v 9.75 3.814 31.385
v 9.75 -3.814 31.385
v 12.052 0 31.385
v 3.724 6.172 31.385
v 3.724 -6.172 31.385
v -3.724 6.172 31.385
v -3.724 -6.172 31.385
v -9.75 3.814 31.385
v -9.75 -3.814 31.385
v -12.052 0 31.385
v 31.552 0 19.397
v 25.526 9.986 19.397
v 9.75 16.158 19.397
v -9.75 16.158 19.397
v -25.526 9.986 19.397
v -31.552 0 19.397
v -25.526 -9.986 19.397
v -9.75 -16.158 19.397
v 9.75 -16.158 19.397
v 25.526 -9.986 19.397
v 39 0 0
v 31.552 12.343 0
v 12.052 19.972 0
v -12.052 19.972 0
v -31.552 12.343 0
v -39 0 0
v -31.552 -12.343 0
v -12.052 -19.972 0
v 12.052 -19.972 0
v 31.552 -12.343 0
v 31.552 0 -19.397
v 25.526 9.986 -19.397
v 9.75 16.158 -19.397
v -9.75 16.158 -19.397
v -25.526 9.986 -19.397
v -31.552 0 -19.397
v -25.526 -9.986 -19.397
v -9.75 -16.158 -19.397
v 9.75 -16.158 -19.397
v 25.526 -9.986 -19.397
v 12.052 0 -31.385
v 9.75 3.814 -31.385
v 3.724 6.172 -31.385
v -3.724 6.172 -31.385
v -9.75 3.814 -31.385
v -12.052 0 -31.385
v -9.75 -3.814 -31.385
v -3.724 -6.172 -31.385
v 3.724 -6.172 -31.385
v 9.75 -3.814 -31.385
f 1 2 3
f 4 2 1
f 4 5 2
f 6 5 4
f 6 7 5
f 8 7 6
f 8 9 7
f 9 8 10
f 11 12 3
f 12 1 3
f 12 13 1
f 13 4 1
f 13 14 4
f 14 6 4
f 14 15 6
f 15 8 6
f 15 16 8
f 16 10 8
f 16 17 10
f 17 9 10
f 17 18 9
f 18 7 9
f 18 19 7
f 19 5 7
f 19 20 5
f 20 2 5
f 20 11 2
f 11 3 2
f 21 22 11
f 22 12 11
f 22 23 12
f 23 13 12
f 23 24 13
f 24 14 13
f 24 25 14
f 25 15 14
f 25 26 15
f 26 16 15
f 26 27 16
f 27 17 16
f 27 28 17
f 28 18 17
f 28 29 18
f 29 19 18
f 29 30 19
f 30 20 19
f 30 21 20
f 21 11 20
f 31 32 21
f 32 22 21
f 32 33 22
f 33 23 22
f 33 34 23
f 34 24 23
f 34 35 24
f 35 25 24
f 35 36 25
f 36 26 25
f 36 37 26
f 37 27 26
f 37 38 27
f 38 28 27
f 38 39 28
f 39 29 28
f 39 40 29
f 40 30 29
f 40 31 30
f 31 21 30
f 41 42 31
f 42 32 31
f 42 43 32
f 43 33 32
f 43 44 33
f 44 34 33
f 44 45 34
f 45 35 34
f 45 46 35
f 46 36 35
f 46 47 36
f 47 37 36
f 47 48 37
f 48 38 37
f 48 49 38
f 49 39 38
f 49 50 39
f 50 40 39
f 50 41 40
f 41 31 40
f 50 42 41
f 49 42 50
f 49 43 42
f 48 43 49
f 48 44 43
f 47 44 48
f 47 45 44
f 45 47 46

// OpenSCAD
// Generated by SolidPython 1.0.1 on 2020-07-29 00:46:50


scale(v = [13, 7, 11]) {
	sphere(r = 3);
}
/***********************************************
*********      SolidPython code:      **********
************************************************
 
# import packages: SolidPython
from solid import *
from solid.utils import *
from itertools import chain, combinations, permutations


class Resize:

    def __init__(self, scad_file):
        self.scad_file = scad_file
        #self.scad_file = import_scad(scad_file)
        # cone/cylinder param:
        self.r1 = 0
        self.r2 = 0
        self.h = 0
        # rectangular prism param:
        self.w = 0
        self.l = 0
        # ellipse param:
        self.r = 0

    # import OpenScad code (file name corresponds to shape)


    # classify shape + parameters
    def assign(self, param1, param2, param3):
        if self.scad_file == 'cone.scad':
            self.r1 = param1
            self.r2 = param2
            self.h = param3
        elif self.scad_file == 'cylinder.scad':
            self.r1 = param1
            self.r2 = param2
            self.h = param3
        elif self.scad_file == 'rectangularPrism.scad':
            self.h = param1
            self.l = param2
            self.w = param3
        else:
            self.r = param1
            self.h = param2

    # resize parameters
    def iterate(self):
        x = range(3, 20, 2)
        i = 1
        if self.scad_file == 'cone.scad':
            tempList = list(permutations(x, 2))
            for temp in tempList:
                param1 = temp[0]
                param2 = temp[1]
                filepath = 'produced_scad_files/' + 'cone' + str(param1) + '_' + str(param2) + '_' + '.scad'
                scad_render_to_file(cylinder(h=param1, r1=param2, r2=0), filepath)

        elif self.scad_file == 'cylinder.scad':
            tempList = list(permutations(x, 3))
            for temp in tempList:
                param1 = temp[0]
                param2 = temp[1]
                filepath = 'produced_scad_files/' + 'cylinder' + str(param1) + '_' + str(param2) + '_' + '.scad'
                scad_render_to_file(cylinder(h=param1, r1=param2, r2=param2), filepath)

        elif self.scad_file == 'rectangularPrism.scad':
            tempList = list(permutations(x, 3))
            for temp in tempList:
                param1 = temp[0]
                param2 = temp[1]
                param3 = temp[2]
                filepath = 'produced_scad_files/' + 'rectangularPrism' + str(param1) + '_' + str(param2) + '_' + str(
                    param3) + '.scad'
                scad_render_to_file(cube(size=(param1, param2, param3)), filepath)

        elif self.scad_file == 'ellipse.scad':
            tempList = list(permutations(x, 4))
            for temp in tempList:
                param1 = temp[0]
                param2 = temp[1]
                param3 = temp[2]
                param4 = temp[3]
                filepath = 'produced_scad_files/' + 'ellipse' + str(param1) + '_' + str(param2) + '_' + str(param3) + '_' + str(param4) + '.scad'
                scad_render_to_file(scale([param1, param2, param3])(sphere(r=param4)), filepath)

    def render_to_scadfile(self):
        scad_render_to_file(scad, 'example.scad') 
 
************************************************/
